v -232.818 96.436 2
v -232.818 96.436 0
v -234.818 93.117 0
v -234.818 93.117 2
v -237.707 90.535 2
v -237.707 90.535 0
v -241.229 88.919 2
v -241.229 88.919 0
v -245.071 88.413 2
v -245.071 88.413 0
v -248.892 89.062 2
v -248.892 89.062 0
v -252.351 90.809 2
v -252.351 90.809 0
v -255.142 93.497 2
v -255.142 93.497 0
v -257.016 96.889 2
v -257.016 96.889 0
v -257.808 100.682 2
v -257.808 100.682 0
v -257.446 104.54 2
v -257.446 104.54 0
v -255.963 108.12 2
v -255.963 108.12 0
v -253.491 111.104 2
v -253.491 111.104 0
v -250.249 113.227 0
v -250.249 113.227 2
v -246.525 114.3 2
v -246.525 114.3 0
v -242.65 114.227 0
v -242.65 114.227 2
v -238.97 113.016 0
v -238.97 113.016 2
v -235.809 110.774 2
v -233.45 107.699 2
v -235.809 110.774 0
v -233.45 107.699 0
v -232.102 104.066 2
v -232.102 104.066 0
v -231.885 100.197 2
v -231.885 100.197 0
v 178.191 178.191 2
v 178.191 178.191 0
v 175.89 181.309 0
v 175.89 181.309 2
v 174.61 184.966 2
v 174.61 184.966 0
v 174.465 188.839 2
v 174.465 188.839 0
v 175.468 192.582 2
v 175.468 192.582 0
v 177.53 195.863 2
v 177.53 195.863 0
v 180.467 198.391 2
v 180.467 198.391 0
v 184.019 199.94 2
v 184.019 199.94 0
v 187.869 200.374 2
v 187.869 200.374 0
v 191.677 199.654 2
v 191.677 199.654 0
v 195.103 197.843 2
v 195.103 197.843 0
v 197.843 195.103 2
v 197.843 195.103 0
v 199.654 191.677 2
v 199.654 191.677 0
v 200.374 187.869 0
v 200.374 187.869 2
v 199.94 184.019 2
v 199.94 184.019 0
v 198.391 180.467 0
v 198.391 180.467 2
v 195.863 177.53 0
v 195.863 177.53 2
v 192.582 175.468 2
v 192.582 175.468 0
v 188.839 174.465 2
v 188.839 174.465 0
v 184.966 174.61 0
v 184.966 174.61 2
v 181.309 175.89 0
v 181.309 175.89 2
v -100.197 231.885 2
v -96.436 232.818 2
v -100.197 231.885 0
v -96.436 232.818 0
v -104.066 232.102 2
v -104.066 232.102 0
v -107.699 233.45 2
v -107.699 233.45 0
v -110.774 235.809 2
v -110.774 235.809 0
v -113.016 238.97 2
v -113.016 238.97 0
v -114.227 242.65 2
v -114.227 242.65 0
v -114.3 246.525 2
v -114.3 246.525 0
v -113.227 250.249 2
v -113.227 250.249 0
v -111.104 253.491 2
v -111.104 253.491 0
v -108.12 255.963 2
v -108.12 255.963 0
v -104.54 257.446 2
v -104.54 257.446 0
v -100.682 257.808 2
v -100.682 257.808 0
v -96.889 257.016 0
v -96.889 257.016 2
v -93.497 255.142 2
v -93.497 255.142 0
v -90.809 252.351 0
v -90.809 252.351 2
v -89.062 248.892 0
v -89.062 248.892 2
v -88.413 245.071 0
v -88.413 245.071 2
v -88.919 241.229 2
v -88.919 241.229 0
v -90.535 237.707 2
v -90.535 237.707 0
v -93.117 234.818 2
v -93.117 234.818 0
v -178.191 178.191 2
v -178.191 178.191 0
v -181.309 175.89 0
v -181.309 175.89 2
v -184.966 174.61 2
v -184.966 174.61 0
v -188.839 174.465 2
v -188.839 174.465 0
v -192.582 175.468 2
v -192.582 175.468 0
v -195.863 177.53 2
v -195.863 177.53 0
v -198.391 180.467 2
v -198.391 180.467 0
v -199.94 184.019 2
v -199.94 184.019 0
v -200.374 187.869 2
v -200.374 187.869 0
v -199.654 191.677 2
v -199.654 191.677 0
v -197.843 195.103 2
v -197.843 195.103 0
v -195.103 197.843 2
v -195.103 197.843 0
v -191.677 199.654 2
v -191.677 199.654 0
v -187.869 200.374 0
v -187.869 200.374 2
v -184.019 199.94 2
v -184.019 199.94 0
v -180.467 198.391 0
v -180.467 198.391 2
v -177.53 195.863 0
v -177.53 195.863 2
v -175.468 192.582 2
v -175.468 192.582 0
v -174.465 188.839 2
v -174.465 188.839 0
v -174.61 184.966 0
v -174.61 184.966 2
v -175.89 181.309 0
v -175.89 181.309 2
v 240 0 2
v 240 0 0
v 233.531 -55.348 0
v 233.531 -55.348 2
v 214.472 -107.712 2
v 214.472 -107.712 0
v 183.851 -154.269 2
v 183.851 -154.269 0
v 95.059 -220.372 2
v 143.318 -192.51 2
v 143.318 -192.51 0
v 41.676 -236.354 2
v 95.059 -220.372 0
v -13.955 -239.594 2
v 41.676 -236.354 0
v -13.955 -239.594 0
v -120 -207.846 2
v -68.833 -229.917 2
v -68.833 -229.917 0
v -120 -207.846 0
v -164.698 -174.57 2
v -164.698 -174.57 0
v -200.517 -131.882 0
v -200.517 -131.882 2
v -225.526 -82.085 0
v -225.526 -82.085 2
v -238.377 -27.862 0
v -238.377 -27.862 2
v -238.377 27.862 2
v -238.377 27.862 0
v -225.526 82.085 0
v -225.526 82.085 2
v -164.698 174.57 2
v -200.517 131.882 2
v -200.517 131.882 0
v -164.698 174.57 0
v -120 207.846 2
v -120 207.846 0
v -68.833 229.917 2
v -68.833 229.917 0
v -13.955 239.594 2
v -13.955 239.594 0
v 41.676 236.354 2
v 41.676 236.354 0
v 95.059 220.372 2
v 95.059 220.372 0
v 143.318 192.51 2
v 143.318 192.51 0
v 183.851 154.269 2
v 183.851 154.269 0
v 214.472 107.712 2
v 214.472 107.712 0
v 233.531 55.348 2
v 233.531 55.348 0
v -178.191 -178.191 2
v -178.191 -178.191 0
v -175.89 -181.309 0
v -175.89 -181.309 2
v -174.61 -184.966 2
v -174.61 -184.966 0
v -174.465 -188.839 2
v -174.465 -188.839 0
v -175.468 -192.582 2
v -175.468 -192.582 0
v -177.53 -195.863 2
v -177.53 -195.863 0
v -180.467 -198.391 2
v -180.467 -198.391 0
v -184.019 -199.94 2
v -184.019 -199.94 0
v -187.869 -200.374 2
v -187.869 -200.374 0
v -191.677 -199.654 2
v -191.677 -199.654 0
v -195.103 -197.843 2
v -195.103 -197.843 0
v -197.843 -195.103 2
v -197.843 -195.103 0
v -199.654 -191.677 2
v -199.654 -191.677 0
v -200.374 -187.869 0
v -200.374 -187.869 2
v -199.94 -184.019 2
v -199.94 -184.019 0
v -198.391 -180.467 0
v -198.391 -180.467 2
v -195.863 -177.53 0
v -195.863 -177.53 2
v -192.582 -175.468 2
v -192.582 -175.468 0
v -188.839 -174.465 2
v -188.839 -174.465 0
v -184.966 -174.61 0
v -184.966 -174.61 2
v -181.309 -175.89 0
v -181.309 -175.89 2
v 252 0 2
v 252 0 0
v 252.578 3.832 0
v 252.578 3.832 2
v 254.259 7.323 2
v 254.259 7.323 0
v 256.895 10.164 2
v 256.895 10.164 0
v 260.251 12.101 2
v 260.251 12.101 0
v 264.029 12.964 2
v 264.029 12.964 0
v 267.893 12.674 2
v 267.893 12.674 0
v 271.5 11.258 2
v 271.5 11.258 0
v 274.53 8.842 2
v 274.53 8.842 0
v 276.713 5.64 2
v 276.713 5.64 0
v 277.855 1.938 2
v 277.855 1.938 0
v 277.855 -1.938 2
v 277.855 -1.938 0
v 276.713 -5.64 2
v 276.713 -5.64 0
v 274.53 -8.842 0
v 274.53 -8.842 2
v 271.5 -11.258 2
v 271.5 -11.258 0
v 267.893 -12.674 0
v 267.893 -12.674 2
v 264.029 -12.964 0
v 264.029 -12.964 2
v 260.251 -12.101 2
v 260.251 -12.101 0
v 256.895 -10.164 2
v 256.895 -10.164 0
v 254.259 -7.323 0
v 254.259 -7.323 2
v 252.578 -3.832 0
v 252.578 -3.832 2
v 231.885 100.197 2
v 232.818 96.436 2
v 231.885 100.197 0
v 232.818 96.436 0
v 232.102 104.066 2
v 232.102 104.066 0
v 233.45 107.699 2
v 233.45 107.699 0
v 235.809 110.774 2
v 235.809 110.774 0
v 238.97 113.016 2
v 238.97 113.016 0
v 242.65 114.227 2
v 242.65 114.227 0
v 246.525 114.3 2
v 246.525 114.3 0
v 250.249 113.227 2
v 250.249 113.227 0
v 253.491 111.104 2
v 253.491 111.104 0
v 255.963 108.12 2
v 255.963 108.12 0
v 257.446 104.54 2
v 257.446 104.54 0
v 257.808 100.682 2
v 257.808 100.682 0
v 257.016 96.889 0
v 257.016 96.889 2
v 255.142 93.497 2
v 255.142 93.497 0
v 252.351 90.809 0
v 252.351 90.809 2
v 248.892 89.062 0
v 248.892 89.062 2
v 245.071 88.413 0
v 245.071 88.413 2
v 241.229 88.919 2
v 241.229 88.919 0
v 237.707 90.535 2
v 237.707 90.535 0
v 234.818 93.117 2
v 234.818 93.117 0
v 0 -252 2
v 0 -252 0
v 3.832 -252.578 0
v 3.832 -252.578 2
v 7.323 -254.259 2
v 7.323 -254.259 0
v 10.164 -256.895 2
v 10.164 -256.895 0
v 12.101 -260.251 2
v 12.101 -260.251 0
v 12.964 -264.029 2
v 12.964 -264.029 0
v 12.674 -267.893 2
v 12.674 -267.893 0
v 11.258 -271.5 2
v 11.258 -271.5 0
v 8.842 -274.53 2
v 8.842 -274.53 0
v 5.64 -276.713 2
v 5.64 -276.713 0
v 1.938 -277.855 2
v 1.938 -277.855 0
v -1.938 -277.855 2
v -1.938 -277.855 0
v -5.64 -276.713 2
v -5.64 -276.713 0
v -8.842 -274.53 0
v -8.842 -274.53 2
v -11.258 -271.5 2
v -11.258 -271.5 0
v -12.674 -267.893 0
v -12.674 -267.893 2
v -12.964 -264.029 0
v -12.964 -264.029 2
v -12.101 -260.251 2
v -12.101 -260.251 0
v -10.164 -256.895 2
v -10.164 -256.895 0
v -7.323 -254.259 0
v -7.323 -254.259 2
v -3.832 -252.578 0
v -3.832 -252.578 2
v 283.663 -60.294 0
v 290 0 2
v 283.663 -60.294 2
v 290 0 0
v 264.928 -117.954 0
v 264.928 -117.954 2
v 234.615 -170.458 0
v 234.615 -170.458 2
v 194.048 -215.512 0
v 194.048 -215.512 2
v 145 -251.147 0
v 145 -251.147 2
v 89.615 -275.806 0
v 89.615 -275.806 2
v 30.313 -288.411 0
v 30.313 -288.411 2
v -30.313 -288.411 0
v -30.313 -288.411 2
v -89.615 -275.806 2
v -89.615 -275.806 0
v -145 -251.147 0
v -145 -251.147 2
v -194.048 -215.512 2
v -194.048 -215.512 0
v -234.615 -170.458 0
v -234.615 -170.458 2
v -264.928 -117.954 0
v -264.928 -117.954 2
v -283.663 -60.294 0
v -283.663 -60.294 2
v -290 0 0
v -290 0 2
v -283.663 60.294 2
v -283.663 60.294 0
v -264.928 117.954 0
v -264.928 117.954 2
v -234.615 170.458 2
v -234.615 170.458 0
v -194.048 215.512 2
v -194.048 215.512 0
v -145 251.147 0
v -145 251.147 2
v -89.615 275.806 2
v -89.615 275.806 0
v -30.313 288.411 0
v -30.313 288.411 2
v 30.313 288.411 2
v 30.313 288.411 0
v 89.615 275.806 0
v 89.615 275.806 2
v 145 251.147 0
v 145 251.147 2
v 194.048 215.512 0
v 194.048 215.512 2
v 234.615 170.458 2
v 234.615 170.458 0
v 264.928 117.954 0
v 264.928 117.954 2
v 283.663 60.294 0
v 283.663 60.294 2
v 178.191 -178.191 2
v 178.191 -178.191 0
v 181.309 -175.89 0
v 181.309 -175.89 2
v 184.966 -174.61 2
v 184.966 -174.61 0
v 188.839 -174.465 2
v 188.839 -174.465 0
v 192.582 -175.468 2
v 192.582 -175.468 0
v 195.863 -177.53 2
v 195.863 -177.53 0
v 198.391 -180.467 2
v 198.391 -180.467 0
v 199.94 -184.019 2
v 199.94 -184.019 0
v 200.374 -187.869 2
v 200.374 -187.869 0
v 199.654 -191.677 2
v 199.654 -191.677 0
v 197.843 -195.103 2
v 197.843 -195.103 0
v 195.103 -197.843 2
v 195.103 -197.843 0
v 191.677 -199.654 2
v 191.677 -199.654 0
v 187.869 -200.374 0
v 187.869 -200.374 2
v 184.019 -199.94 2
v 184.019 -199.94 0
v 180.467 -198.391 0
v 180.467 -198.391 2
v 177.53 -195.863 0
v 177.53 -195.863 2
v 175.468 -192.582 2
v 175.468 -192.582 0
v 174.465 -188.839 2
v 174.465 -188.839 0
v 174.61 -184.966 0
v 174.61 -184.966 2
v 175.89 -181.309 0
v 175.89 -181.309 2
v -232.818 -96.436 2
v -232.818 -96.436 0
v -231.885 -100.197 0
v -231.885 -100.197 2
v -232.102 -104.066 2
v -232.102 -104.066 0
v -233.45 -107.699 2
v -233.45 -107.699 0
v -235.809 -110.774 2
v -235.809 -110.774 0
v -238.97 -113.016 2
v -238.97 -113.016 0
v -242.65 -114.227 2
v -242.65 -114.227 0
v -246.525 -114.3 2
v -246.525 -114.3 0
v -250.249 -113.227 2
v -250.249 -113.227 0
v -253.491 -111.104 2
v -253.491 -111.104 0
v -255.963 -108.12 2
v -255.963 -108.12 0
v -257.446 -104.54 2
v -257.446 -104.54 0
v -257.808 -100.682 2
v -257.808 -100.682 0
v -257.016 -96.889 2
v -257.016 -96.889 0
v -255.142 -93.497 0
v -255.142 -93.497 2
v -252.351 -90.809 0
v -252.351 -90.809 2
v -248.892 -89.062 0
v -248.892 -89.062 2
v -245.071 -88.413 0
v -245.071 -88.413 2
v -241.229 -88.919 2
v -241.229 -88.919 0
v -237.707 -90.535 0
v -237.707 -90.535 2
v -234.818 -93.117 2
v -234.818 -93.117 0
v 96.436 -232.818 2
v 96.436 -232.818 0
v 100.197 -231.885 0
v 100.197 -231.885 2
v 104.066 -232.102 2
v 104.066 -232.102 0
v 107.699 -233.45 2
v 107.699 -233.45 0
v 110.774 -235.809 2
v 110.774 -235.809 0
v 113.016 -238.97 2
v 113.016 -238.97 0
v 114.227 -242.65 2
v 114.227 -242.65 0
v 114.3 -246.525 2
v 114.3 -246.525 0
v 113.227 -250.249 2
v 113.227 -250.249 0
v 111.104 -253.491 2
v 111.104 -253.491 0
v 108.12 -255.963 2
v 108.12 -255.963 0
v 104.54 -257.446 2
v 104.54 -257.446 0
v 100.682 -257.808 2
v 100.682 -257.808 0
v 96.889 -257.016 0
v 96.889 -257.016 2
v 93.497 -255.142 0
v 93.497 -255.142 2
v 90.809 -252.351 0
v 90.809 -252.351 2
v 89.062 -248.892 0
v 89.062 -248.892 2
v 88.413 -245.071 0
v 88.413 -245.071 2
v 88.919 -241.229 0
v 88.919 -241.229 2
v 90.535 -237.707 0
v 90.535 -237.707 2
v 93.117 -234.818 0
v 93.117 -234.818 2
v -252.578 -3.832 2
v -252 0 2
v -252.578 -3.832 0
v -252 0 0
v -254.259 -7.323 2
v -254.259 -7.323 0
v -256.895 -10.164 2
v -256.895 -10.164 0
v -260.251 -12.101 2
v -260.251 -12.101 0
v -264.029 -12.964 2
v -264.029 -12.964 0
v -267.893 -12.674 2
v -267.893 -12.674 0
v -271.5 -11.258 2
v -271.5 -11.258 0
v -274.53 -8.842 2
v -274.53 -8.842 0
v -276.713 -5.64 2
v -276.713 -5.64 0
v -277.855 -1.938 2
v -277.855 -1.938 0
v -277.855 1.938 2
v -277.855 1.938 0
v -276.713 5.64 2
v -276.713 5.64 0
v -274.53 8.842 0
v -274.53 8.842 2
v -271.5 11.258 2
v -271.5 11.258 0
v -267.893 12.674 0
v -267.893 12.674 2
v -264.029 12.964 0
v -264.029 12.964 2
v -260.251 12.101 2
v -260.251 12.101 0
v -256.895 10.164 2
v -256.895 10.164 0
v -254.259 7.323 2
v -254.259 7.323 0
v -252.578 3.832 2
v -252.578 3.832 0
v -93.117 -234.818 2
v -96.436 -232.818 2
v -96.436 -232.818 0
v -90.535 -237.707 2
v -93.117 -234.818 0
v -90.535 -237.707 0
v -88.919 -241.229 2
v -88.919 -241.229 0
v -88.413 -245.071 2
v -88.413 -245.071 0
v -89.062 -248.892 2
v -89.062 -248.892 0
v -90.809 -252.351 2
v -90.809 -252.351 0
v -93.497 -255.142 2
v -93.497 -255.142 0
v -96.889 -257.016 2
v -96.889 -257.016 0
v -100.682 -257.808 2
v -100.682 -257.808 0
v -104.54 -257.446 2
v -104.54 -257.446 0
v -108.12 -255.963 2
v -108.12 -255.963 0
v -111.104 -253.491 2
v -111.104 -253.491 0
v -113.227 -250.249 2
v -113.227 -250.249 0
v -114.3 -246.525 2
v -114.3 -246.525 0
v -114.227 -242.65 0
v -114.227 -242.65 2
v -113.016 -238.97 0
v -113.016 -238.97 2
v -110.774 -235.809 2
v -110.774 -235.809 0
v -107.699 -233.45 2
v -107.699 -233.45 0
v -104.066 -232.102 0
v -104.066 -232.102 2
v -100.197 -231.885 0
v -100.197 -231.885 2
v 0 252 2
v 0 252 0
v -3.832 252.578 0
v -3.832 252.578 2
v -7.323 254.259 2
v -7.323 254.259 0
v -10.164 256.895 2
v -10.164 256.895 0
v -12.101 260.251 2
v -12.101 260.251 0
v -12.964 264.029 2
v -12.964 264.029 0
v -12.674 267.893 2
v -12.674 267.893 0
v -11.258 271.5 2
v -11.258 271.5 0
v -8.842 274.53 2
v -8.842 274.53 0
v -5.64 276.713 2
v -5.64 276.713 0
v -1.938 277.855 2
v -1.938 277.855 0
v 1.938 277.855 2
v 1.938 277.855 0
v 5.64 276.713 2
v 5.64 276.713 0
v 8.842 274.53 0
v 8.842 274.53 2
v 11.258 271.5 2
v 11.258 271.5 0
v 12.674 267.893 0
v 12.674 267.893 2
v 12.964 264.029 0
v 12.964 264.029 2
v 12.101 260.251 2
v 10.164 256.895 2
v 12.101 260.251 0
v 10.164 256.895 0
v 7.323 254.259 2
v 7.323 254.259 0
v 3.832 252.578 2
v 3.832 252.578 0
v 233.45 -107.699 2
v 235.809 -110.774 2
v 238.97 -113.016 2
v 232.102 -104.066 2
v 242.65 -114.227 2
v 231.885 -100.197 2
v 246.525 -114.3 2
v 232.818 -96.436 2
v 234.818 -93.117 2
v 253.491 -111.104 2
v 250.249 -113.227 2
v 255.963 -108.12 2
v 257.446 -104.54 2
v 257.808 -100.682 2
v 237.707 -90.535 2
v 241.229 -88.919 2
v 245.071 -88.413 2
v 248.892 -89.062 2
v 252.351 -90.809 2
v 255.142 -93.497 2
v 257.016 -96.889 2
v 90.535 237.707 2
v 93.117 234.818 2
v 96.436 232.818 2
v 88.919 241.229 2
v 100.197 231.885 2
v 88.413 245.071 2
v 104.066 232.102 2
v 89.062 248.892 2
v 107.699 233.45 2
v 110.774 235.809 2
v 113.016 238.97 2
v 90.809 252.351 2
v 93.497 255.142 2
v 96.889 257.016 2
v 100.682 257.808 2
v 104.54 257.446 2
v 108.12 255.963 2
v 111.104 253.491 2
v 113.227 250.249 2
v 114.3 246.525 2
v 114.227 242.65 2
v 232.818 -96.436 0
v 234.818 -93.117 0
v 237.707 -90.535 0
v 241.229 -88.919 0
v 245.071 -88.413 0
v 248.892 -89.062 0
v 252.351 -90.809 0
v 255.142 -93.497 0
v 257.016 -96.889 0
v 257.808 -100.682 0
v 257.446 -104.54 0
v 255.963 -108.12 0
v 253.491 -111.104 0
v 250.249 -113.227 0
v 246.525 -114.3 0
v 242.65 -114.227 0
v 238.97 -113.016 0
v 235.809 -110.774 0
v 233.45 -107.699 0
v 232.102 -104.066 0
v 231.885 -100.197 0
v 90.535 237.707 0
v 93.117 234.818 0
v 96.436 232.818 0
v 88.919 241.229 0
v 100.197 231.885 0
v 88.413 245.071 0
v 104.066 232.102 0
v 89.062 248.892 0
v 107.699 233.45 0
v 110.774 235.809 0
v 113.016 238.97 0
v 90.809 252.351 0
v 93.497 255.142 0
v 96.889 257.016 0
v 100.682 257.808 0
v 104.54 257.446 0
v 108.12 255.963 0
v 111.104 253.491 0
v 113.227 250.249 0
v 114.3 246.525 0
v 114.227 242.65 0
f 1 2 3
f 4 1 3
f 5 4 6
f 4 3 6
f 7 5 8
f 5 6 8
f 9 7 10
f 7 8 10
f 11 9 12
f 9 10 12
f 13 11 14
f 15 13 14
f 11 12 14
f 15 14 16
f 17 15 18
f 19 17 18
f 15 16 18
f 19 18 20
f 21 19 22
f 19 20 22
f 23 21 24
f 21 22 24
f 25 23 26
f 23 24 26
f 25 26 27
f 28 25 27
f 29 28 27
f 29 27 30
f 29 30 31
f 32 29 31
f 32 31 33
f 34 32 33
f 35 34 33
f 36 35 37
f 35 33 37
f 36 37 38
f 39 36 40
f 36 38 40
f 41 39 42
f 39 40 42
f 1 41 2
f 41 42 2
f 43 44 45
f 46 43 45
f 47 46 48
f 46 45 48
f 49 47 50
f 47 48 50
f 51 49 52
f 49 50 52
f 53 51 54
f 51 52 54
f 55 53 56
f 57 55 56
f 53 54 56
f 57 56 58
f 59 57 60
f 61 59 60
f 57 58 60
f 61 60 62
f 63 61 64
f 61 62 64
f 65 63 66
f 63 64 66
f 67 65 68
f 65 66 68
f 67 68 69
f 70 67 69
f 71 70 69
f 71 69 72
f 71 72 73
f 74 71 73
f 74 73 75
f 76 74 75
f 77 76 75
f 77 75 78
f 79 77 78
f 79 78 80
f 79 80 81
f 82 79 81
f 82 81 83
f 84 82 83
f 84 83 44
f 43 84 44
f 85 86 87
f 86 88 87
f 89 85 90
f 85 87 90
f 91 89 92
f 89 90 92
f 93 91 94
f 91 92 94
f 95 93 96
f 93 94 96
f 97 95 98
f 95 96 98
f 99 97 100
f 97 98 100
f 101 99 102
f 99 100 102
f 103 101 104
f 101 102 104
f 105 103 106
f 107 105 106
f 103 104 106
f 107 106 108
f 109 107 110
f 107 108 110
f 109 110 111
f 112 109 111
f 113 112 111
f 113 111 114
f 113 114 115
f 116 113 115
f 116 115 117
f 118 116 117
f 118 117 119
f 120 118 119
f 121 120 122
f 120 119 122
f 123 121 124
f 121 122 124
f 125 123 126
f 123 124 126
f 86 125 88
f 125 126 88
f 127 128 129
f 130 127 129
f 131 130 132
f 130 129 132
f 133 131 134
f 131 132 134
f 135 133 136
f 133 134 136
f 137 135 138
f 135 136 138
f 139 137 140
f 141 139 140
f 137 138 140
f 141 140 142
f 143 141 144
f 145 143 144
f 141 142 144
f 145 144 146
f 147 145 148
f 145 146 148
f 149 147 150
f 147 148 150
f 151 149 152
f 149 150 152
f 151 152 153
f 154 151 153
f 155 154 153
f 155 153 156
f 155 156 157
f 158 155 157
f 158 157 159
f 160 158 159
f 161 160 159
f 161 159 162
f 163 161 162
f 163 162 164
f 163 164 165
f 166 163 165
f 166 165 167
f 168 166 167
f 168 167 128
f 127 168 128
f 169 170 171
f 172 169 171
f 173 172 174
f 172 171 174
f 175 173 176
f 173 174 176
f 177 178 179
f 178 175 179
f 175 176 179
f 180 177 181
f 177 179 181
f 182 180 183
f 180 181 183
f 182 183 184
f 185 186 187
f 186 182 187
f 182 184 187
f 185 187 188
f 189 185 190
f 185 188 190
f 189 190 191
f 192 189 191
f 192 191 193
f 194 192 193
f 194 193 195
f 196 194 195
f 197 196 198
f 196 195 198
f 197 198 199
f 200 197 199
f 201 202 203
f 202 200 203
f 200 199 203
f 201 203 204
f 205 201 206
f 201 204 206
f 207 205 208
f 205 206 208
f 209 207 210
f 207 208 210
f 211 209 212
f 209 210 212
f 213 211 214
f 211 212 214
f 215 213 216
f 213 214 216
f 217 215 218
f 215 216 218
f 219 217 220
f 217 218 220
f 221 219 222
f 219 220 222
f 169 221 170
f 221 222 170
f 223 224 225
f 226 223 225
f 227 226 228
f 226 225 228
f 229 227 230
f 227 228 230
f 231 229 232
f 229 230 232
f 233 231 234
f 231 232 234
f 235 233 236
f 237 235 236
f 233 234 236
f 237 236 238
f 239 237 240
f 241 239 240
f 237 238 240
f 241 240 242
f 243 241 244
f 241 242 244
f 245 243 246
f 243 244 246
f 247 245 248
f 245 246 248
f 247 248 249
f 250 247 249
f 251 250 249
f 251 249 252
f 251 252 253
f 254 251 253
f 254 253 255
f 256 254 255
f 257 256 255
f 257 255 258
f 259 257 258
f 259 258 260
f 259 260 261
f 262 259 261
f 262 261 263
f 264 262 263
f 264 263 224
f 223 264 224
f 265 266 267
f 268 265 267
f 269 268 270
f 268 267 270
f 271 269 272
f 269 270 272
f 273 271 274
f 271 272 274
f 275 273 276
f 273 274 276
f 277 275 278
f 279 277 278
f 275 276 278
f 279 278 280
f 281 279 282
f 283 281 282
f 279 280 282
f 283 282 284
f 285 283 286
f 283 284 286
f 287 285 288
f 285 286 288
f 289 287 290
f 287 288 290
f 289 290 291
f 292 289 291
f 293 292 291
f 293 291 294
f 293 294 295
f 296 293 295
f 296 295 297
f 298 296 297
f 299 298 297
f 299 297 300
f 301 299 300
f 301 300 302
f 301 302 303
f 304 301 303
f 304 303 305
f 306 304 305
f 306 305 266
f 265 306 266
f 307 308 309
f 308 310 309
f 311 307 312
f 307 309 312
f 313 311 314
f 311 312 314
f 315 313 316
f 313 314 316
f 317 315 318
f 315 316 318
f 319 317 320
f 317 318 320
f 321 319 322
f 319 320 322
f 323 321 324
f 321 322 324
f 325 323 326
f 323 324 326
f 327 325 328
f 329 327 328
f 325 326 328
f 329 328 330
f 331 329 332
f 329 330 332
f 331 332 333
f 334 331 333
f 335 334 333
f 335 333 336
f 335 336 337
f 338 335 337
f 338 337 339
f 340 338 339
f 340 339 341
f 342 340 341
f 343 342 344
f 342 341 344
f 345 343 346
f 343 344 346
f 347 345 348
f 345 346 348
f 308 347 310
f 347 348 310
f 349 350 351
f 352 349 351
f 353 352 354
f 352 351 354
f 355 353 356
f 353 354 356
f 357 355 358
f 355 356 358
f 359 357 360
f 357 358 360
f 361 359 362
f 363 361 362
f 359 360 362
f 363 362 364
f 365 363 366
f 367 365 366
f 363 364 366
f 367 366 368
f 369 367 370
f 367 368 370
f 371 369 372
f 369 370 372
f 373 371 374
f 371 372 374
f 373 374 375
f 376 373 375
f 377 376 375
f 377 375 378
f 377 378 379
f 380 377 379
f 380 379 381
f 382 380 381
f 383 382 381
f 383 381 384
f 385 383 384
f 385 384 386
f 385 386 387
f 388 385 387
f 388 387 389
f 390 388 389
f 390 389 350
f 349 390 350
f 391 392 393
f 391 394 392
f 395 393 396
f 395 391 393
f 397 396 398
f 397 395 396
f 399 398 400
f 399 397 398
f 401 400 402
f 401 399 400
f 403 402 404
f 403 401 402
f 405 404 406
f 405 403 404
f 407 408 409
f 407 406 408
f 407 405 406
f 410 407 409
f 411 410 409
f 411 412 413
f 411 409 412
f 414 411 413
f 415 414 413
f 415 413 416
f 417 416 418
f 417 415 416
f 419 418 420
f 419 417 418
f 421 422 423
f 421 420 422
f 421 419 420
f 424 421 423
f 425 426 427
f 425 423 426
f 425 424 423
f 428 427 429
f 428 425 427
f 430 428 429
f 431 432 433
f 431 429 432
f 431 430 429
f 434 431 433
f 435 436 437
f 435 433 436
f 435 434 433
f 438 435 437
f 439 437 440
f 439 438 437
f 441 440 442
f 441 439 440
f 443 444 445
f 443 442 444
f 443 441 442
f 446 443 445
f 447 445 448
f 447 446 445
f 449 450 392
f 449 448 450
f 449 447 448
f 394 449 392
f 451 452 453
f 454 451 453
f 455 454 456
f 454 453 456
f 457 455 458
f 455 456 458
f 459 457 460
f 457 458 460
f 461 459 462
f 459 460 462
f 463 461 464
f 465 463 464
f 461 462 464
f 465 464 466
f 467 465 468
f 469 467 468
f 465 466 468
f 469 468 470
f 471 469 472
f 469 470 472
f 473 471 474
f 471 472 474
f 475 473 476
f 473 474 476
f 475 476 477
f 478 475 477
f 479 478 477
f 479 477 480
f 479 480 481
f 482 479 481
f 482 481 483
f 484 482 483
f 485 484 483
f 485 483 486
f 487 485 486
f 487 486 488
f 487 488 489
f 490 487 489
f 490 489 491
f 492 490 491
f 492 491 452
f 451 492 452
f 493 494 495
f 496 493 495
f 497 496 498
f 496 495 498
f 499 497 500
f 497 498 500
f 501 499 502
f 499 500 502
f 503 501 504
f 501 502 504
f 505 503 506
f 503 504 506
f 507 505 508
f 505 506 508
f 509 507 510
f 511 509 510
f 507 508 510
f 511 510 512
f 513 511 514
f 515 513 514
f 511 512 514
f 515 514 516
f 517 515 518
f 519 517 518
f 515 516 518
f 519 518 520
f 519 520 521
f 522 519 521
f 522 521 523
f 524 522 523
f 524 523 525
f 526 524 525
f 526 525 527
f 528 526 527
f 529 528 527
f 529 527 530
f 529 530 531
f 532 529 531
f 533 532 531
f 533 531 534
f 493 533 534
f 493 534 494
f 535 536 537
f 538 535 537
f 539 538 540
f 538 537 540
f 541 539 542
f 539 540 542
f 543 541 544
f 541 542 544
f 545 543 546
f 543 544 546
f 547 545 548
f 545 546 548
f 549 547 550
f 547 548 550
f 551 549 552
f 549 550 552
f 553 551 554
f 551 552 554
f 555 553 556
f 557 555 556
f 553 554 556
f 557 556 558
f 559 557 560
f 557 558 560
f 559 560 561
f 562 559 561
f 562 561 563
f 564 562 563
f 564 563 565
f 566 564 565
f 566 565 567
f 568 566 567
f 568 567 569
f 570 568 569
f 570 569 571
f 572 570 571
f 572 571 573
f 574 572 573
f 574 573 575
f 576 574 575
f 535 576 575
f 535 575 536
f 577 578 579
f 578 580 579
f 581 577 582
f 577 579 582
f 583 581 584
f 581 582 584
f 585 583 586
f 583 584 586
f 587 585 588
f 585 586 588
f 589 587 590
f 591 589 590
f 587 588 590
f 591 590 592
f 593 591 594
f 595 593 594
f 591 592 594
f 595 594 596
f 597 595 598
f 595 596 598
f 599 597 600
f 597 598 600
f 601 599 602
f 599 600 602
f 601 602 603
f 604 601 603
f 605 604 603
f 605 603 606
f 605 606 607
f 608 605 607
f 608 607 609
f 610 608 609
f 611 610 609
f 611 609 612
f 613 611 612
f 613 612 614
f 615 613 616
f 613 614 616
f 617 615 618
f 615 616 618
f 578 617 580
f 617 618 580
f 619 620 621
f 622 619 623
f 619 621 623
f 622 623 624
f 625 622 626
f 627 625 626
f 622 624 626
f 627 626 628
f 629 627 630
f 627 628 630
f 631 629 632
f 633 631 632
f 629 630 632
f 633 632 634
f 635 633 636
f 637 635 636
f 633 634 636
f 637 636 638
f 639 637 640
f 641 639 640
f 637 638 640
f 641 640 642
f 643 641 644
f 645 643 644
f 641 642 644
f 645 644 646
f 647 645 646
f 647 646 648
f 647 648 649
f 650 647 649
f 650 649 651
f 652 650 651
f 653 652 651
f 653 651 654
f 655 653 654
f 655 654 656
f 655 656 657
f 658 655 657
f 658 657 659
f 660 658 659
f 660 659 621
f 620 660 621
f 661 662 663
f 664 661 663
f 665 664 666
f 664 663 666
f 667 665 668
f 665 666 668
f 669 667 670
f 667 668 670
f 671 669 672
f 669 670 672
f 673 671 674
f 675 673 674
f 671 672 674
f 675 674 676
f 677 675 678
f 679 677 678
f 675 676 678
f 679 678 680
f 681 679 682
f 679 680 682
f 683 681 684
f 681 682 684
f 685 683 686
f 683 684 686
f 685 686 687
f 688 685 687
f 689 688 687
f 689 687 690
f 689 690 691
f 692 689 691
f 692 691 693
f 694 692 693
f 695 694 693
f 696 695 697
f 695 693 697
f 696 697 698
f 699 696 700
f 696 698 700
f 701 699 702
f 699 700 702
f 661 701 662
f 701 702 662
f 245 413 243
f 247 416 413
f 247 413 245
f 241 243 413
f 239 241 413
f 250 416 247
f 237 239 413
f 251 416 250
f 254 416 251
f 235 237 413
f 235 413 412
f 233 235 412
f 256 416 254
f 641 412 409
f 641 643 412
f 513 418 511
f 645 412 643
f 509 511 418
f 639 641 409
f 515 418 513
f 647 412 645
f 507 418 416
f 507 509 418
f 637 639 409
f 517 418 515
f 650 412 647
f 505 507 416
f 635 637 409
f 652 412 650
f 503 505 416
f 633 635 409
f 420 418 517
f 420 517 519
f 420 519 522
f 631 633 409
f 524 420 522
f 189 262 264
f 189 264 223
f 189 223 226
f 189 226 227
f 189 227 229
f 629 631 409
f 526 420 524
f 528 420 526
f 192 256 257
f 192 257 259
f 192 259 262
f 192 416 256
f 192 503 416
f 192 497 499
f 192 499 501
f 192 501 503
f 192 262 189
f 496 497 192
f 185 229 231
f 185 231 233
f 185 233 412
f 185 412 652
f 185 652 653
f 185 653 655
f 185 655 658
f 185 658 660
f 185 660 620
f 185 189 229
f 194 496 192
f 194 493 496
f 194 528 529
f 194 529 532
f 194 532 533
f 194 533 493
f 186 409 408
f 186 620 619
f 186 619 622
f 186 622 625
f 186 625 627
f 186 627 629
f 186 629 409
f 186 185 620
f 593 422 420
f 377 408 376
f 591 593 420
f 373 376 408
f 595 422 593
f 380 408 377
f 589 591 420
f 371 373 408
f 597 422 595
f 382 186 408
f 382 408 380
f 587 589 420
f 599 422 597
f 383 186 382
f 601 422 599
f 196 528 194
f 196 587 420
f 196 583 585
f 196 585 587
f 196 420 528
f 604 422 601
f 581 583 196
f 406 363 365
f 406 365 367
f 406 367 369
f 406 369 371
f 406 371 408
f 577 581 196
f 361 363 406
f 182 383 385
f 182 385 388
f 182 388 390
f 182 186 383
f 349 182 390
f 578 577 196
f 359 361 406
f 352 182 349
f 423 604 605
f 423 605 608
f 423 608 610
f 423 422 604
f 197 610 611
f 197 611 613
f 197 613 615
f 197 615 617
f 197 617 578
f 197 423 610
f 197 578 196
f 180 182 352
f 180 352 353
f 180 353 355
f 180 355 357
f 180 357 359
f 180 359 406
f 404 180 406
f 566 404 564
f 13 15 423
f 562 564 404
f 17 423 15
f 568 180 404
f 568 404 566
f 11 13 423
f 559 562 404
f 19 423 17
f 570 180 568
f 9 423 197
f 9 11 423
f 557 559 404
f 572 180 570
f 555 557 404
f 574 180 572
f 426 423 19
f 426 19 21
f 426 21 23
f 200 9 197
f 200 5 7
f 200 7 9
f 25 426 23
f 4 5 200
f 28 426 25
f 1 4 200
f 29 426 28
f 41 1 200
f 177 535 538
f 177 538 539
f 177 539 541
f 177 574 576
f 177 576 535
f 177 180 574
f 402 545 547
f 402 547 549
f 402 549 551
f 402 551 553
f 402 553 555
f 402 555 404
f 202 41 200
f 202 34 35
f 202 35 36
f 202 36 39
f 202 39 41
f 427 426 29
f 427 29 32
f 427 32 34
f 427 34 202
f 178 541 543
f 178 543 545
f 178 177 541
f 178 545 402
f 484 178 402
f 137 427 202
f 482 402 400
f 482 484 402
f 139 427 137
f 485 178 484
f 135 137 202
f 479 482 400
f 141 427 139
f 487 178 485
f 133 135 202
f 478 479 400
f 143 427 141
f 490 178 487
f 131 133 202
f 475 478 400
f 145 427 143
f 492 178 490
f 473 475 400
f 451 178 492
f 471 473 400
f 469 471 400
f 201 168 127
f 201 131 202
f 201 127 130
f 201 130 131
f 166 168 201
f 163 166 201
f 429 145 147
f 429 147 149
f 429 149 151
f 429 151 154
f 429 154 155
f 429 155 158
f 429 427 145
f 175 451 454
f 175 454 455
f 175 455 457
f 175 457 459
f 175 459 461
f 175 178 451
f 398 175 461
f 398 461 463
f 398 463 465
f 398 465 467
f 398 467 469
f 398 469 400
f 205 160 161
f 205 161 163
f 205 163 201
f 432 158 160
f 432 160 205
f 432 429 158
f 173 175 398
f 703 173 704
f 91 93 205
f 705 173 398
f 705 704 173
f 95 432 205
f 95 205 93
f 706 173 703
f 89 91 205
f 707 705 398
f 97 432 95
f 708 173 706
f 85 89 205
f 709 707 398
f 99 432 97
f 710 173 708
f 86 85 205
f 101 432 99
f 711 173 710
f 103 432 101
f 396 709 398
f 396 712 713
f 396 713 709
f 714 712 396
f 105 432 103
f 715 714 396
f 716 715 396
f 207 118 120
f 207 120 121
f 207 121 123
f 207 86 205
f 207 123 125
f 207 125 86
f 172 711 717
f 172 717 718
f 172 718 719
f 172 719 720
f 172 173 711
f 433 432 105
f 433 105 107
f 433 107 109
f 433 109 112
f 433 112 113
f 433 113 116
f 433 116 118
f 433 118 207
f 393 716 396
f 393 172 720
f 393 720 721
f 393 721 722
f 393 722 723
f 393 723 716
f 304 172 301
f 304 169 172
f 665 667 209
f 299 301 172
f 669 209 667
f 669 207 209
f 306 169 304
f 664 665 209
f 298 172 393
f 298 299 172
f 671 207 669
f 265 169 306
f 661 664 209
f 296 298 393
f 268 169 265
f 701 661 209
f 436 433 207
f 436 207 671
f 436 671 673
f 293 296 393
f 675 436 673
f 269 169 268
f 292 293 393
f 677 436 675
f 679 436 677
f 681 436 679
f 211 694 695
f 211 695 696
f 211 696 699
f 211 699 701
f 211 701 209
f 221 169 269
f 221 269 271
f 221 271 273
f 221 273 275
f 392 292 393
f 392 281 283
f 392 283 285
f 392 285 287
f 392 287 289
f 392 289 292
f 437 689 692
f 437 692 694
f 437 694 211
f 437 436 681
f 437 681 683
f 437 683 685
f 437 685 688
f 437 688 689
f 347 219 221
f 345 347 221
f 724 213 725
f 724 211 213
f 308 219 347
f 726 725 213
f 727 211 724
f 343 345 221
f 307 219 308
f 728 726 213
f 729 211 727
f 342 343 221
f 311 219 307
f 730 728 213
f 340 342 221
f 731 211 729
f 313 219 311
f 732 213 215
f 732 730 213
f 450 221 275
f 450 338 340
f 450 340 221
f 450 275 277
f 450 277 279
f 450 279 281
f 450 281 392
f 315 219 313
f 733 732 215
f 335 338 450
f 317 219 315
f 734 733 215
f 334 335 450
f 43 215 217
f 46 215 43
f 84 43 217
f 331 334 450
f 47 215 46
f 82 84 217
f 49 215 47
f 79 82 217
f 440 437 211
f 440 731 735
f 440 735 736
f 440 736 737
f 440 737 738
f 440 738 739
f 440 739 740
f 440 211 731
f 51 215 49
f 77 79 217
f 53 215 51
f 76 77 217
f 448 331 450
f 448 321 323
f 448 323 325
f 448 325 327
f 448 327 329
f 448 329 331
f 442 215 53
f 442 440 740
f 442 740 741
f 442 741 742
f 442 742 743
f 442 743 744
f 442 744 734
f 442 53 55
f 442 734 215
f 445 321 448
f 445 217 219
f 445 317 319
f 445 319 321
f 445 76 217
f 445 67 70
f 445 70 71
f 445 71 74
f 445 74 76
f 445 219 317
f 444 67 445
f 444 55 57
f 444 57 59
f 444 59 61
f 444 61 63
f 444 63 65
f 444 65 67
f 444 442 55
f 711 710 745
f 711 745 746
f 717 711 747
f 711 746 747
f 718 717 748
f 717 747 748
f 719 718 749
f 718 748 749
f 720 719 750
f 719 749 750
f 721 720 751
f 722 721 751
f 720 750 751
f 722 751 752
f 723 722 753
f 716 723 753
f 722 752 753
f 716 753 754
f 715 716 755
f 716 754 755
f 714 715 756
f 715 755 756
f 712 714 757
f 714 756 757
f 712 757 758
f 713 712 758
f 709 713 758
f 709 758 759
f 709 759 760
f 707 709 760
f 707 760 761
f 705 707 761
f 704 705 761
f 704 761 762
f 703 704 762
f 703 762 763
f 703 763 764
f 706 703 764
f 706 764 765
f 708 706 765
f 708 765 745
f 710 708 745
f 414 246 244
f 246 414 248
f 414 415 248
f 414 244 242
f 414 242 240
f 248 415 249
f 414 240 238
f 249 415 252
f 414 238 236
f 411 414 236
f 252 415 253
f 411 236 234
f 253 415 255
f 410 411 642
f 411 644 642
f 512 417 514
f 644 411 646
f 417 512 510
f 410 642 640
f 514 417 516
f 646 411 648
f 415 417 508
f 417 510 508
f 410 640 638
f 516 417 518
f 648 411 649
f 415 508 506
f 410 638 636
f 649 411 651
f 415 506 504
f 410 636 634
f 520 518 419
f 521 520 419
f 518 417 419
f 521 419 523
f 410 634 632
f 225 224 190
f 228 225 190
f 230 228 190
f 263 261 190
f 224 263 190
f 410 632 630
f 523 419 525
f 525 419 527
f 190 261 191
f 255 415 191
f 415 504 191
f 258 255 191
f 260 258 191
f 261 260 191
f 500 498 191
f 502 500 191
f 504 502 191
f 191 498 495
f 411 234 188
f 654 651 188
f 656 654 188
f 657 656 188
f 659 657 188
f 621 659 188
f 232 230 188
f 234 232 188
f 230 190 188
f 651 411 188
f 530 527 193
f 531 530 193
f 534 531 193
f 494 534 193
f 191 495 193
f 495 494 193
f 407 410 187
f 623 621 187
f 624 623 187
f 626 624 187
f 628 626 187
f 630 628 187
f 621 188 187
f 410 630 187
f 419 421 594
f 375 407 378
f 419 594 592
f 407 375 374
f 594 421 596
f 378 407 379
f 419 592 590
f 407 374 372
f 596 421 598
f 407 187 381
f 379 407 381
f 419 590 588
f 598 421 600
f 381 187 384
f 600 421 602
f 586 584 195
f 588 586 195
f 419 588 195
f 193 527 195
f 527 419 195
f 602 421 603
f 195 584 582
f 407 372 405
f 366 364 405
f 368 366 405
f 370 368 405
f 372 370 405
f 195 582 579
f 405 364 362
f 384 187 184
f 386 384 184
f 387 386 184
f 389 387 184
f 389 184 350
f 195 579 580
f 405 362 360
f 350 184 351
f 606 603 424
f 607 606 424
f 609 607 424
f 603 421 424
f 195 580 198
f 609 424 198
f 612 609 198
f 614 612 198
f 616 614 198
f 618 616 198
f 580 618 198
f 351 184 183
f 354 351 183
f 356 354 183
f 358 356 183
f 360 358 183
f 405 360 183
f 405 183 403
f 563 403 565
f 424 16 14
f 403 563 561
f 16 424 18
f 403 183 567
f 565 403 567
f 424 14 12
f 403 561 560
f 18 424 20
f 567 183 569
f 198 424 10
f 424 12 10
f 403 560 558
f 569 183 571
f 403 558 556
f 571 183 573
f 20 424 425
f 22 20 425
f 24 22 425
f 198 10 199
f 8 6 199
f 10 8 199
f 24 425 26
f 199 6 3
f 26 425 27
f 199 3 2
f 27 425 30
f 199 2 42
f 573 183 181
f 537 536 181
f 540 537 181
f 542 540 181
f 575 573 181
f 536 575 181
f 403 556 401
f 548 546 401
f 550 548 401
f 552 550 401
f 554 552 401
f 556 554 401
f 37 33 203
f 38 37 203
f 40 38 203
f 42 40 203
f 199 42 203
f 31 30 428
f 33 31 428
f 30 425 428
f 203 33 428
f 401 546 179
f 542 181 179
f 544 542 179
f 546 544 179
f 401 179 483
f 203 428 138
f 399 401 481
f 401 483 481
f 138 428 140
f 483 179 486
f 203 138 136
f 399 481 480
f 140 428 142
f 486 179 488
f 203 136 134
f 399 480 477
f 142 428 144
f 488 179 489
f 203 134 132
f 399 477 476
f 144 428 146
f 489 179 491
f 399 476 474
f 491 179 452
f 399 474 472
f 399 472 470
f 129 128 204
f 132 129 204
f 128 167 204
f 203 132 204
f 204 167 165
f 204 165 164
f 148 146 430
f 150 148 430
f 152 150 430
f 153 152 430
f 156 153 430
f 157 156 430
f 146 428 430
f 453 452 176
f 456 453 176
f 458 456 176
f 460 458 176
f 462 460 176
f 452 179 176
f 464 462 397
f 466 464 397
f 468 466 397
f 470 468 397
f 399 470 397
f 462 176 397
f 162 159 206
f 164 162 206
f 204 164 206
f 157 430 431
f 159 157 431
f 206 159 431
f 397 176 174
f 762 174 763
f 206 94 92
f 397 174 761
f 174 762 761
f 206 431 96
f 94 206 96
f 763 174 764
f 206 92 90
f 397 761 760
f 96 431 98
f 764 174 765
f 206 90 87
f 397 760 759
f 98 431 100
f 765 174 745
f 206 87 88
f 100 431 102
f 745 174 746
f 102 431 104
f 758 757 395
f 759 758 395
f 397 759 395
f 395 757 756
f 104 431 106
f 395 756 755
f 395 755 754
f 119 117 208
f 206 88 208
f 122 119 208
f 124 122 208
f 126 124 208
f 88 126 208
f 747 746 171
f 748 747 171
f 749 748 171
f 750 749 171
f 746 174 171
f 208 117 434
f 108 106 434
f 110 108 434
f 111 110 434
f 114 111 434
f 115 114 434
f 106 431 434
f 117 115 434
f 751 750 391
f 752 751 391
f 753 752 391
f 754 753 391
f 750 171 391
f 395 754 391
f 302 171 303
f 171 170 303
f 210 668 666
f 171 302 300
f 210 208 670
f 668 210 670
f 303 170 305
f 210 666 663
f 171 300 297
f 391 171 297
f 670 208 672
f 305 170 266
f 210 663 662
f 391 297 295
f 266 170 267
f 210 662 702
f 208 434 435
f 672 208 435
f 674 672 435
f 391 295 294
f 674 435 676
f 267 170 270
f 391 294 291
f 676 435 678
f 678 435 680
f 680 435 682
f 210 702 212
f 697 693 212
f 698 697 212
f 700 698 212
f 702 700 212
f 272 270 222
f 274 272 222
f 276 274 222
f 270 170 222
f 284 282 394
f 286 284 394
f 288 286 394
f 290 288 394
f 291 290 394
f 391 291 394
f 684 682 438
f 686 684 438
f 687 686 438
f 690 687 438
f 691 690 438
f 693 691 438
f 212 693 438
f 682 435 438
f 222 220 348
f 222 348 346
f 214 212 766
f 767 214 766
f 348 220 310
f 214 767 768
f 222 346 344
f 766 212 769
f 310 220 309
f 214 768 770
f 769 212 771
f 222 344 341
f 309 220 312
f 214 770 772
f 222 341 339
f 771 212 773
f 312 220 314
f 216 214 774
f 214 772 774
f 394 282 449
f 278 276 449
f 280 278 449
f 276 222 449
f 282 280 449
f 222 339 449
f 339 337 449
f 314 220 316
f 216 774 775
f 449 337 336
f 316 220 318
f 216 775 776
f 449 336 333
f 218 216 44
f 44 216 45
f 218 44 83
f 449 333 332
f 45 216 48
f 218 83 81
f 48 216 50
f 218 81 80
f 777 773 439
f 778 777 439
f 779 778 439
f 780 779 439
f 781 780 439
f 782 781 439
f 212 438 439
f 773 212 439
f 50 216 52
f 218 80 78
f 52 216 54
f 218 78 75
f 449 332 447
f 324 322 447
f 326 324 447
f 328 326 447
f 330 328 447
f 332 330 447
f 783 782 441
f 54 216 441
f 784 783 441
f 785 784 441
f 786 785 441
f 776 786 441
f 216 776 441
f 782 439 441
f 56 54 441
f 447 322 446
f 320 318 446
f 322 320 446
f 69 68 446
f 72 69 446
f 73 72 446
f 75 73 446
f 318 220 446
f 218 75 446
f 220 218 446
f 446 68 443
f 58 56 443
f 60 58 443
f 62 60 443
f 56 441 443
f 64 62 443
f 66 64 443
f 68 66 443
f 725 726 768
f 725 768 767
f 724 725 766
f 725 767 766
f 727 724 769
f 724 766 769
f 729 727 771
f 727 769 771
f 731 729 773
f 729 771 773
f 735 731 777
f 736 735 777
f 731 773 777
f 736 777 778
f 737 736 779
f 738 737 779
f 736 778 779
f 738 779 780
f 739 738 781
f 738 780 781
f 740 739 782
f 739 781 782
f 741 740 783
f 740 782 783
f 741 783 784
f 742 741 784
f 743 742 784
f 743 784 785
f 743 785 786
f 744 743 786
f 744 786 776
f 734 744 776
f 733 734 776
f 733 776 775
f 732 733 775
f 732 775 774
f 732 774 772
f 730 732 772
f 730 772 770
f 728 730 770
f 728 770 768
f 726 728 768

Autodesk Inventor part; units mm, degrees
ref_plane "YZ Plane" through (0, 0, 0) normal (1, 0, 0) x (0, 1, 0)
ref_plane "XZ Plane" through (0, 0, 0) normal (0, 1, 0) x (-1, 0, 0)
ref_plane "XY Plane" through (0, 0, 0) normal (0, 0, 1) x (1, 0, 0)
sketch "Эскиз1" plane through (0, 0, 0) normal (0, 0, 1) x (1, 0, 0)
  circle A0 centre (0, 0) radius 240
  circle A1 centre (0, 0) radius 290
  dimension "d0" = 480
  dimension "d1" = 580
extrude "Выдавливание1" add sketch "Эскиз1" along normal blind 2
sketch "Эскиз2" plane through (0, 0, 2) normal (0, 0, 1) x (1, 0, 0)
  circle A0 centre (0, 0) radius 290 projected
  line L0 (0, 290) -> (0, 265)
  dimension "d4" = 25
hole "Отверстие1" at (0, 265, 2) direction (0, 0, -1) diameter 26 end through all
pattern_circular "Круговой массив1" count 16 over 360 about axis through (0, 0, -10) along (0, 0, 1) of "Отверстие1"
properties part number "Прокладка крышек цилиндра"
